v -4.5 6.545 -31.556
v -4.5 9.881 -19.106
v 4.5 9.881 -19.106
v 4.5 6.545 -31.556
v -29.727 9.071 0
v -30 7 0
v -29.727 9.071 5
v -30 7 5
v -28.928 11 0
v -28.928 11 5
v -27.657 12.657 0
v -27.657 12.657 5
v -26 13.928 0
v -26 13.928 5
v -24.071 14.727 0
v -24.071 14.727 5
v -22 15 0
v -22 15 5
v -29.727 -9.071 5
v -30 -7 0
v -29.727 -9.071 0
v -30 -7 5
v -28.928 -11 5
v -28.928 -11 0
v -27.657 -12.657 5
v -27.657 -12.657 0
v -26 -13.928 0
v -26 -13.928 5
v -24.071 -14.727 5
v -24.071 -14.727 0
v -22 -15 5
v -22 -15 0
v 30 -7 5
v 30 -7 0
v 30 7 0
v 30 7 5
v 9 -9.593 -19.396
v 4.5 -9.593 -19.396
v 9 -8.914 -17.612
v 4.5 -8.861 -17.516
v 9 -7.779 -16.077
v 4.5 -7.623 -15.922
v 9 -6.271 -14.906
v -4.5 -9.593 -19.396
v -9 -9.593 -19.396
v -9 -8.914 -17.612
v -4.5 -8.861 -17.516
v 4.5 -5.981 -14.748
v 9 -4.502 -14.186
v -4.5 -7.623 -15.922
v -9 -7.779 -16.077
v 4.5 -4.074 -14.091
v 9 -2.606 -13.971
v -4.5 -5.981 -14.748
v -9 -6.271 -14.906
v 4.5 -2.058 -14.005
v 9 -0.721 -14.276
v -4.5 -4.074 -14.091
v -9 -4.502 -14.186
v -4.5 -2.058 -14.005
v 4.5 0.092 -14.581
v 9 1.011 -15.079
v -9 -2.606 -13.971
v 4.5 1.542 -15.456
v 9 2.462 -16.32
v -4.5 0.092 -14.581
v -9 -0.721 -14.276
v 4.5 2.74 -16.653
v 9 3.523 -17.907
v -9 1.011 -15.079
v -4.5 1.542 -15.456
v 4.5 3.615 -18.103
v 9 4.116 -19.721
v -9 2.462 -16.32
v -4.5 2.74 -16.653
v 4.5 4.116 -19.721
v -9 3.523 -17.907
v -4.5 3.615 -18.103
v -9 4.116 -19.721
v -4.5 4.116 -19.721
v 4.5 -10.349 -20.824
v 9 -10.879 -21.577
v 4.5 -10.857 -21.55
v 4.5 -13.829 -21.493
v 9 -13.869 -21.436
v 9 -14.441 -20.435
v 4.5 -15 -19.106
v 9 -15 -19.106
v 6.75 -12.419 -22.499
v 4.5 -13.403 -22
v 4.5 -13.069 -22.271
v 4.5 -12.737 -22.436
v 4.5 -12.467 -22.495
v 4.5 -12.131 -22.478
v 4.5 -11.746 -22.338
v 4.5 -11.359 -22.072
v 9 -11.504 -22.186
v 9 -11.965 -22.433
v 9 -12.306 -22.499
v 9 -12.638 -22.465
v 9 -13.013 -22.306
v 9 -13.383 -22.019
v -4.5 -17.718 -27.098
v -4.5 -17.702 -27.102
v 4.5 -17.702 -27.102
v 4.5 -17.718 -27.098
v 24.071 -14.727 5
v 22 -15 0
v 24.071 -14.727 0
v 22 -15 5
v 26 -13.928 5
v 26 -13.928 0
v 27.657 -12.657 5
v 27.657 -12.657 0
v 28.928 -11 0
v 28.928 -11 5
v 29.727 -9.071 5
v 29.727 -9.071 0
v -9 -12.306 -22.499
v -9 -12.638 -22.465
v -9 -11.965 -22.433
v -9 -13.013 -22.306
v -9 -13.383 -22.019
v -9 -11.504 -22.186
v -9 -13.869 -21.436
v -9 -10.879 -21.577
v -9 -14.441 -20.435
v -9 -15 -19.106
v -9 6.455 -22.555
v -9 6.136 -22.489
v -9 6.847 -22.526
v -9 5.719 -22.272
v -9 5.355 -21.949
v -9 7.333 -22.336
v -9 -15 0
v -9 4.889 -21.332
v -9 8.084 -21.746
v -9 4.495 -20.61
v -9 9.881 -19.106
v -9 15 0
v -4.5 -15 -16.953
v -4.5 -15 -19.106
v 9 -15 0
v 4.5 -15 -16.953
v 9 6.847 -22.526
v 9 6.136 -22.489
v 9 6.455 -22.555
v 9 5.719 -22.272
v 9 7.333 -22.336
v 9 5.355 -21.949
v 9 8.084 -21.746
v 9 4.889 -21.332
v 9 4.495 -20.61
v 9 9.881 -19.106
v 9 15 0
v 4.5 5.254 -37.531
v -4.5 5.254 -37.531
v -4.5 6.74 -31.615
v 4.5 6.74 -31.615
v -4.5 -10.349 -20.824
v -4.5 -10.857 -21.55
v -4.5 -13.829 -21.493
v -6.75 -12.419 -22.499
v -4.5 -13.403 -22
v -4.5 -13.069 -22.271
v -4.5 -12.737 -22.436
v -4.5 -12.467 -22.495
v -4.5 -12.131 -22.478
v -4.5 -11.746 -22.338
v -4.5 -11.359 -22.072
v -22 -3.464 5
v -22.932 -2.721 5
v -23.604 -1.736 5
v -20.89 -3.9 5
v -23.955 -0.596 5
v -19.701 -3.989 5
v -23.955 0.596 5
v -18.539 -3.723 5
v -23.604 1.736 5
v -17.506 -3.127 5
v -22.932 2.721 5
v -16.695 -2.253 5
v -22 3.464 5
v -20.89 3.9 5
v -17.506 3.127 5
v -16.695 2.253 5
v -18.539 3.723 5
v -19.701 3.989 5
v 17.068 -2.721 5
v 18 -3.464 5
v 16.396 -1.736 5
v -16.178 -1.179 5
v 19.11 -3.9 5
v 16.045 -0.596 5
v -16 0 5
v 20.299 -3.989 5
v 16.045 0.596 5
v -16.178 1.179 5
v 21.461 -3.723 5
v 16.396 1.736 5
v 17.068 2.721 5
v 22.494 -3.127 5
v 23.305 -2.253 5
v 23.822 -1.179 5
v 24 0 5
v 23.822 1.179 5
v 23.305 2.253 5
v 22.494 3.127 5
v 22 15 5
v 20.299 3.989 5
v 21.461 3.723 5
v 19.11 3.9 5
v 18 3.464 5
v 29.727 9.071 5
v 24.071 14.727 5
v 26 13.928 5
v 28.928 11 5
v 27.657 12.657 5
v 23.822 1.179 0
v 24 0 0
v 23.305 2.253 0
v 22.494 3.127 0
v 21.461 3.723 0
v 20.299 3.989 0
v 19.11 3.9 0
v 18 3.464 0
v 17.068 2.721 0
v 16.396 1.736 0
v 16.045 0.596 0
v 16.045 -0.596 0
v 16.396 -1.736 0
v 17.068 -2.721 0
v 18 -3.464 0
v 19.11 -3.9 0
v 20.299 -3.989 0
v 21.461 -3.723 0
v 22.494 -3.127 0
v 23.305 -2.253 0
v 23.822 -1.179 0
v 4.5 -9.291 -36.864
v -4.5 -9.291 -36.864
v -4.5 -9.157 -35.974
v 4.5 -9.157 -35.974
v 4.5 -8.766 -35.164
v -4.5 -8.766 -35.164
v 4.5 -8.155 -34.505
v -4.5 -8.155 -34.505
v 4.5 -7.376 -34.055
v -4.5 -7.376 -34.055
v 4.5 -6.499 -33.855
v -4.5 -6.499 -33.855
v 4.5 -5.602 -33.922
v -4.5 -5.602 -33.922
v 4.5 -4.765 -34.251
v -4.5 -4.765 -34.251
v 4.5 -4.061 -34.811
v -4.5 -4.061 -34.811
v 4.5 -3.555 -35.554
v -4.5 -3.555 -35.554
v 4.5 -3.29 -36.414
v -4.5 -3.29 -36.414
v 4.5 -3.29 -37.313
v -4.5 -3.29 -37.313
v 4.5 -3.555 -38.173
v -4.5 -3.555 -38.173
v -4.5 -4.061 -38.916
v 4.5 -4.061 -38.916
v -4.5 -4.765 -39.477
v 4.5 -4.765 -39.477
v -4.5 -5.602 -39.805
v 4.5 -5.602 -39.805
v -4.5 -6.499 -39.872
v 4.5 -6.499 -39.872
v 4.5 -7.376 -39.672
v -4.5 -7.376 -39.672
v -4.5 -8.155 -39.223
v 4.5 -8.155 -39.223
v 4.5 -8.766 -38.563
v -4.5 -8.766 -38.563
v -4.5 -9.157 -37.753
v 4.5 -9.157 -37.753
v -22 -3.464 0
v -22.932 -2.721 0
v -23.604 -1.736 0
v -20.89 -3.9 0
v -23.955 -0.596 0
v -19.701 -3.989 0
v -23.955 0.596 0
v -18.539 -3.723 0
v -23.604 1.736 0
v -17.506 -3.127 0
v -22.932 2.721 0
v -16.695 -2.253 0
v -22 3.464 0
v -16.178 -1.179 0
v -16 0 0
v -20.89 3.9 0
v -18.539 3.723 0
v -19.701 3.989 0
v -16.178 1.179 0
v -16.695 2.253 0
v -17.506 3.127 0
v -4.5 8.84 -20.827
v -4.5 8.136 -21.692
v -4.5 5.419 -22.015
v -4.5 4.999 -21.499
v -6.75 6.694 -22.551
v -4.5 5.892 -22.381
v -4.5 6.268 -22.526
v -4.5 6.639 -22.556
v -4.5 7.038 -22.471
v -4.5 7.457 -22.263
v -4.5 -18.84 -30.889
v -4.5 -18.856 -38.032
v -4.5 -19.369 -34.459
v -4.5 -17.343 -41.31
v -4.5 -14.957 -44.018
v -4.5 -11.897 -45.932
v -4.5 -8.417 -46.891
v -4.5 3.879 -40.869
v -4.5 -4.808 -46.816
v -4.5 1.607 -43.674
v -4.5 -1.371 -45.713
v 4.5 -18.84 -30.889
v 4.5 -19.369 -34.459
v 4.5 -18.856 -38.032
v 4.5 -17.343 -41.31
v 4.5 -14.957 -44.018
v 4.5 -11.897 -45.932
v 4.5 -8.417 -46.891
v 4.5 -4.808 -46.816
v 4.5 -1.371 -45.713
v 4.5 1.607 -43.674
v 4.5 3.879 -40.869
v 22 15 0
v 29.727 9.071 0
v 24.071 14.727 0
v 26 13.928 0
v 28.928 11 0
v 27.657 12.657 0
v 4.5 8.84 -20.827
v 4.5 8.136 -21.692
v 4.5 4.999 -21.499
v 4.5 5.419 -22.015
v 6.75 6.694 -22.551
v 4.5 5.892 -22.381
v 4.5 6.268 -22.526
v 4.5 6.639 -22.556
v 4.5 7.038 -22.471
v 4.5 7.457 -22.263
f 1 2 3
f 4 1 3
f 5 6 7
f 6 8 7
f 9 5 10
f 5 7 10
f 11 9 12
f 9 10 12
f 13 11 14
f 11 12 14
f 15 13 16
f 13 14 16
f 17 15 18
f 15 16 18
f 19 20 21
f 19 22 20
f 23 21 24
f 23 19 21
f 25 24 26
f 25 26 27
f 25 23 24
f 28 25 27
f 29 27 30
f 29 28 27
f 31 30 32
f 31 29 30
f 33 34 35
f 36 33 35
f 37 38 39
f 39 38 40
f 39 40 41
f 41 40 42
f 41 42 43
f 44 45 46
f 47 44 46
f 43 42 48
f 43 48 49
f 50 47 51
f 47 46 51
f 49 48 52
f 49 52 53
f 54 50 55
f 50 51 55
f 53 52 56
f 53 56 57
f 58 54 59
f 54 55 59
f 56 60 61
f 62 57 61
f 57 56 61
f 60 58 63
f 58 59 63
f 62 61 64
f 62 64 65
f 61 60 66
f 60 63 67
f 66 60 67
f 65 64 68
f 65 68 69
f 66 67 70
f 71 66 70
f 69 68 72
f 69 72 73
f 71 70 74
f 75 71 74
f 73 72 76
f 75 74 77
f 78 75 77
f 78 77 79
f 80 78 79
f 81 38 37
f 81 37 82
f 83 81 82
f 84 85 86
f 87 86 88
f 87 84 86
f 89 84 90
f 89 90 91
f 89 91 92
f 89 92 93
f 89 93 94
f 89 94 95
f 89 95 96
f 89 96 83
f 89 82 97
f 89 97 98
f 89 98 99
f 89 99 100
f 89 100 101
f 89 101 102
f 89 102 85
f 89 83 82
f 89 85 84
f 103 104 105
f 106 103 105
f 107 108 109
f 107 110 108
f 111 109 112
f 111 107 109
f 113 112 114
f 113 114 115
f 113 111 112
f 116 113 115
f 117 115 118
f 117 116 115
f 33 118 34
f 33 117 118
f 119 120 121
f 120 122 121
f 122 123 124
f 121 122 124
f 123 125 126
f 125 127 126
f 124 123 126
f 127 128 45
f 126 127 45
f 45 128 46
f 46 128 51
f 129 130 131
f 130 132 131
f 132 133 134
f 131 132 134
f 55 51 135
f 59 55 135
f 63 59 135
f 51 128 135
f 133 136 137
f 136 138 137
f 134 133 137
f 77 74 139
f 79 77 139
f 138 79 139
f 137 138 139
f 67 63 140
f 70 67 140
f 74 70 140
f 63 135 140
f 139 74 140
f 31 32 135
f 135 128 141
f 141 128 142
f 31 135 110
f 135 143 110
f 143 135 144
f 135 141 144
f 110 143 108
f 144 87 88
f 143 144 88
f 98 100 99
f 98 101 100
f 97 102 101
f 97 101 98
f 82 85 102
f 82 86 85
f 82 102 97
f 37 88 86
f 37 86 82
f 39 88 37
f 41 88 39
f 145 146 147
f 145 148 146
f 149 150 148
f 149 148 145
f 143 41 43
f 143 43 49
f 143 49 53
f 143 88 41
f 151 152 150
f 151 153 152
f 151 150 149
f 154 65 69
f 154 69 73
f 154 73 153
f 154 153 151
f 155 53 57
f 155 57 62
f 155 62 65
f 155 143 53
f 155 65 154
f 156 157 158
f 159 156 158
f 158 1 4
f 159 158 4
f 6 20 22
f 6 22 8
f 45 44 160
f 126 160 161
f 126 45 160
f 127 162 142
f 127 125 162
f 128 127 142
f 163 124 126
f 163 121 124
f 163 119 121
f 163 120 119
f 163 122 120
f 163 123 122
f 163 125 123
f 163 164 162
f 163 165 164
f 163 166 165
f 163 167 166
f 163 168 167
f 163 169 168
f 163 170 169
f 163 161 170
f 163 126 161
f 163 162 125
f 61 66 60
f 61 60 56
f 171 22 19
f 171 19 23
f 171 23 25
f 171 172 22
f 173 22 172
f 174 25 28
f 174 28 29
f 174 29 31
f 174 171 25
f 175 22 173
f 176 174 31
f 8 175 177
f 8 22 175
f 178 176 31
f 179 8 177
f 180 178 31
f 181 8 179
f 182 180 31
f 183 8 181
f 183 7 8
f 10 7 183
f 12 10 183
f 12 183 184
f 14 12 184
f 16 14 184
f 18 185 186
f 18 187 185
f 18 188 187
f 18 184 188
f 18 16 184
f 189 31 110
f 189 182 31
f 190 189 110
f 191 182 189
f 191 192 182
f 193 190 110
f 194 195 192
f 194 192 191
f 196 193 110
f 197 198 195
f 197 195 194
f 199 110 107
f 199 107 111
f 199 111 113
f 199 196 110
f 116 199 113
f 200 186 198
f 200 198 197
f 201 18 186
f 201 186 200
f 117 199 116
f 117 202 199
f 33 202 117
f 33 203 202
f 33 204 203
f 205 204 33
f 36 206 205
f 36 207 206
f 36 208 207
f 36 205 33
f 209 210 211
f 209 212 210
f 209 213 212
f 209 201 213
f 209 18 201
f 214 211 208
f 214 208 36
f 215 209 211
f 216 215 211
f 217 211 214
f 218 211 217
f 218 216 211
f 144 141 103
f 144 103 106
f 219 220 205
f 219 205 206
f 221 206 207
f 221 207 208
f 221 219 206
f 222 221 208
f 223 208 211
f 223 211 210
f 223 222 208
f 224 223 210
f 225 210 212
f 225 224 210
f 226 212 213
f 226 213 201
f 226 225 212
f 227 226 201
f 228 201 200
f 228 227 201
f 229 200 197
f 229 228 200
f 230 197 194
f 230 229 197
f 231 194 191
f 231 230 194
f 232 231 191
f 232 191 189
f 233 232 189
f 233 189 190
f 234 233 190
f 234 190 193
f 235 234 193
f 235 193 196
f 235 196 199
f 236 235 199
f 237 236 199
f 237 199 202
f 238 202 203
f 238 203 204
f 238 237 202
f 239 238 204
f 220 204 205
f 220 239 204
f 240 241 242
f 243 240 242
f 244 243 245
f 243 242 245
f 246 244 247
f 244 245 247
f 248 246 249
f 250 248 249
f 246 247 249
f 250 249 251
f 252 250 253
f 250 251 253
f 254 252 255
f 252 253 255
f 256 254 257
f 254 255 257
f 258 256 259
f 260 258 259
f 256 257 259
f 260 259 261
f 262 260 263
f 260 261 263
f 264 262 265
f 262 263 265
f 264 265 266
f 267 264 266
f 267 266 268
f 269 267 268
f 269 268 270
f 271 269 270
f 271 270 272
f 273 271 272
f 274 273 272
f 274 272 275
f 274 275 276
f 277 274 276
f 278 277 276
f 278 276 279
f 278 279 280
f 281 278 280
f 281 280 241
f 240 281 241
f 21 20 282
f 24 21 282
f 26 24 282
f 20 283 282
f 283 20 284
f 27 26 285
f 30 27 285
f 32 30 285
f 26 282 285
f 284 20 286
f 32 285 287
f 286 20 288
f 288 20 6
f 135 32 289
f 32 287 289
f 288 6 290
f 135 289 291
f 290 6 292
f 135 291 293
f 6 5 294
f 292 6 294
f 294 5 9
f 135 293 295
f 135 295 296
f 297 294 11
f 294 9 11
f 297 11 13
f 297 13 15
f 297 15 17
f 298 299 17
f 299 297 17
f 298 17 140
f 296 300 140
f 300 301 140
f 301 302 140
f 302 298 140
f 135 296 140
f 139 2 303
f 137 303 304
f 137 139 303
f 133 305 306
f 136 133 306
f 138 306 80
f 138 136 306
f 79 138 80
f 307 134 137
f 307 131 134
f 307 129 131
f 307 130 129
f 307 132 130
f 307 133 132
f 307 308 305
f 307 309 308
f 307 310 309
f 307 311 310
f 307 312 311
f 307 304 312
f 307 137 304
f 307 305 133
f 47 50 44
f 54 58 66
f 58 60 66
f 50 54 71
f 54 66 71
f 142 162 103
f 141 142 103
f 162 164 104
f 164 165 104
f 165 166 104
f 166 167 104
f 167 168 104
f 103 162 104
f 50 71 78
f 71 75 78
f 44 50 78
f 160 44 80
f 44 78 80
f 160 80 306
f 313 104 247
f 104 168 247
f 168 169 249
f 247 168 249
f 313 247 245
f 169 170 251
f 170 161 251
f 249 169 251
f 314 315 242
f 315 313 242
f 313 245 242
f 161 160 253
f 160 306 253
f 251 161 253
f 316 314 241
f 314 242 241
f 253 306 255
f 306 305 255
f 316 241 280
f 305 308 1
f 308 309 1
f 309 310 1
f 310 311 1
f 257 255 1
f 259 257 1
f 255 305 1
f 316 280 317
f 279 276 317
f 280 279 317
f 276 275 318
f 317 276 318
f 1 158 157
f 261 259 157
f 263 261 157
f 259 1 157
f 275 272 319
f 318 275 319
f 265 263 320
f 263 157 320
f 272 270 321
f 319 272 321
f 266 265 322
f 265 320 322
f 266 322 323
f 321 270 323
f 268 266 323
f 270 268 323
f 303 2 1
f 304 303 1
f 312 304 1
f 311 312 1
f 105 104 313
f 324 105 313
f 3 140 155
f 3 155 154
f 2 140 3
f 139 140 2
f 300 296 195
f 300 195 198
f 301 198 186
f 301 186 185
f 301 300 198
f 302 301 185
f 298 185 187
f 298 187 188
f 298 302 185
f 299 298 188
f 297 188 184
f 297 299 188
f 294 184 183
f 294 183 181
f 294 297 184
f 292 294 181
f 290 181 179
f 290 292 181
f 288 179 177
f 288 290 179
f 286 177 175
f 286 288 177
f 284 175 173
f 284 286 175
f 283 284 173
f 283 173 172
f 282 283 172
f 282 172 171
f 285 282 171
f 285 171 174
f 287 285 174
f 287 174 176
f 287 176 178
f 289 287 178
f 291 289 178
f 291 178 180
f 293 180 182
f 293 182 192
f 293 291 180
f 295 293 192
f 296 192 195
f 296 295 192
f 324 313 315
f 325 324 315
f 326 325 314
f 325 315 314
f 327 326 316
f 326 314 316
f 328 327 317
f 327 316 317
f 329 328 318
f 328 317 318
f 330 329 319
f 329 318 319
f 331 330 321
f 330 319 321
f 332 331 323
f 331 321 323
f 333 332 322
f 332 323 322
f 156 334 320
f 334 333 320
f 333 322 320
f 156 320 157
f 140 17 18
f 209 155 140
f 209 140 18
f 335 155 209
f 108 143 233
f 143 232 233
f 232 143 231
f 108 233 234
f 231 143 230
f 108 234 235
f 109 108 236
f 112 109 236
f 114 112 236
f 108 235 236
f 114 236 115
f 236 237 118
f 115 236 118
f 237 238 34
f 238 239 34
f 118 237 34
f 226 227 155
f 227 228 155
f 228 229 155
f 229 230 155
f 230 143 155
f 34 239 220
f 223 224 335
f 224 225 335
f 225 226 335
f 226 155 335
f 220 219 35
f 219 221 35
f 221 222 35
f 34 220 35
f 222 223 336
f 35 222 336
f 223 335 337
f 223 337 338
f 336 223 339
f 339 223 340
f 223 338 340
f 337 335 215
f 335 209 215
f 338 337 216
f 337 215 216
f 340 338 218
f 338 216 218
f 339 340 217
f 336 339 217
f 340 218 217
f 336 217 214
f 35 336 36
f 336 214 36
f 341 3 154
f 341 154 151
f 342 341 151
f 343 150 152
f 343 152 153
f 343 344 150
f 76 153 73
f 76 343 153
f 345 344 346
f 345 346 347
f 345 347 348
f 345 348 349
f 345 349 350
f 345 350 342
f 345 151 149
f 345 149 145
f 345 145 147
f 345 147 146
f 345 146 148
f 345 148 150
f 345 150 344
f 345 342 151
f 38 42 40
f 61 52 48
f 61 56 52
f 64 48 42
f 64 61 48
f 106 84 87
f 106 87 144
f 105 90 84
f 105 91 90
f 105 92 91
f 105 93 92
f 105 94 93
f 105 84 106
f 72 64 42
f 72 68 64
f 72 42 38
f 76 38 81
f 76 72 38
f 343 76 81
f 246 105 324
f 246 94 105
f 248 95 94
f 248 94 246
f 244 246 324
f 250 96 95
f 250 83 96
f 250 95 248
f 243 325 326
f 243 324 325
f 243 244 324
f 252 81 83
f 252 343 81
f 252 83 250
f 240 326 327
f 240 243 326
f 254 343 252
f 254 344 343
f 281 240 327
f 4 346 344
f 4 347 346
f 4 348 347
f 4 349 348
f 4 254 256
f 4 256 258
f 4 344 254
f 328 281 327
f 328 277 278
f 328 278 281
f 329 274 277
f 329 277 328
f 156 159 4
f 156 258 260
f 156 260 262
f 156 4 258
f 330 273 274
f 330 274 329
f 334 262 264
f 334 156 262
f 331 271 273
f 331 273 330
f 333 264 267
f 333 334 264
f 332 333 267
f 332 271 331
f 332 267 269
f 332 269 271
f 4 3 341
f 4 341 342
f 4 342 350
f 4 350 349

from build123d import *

# Parameters (mm, degrees)
SKETCH6_W            = 60
SKETCH6_H            = 30
SKETCH6_R            = 4
BOSS_EXTRUDE1_DEPTH  = 5
FILLET3_R            = 8
SKETCH8_W            = 18
SKETCH8_H            = 30
BOSS_EXTRUDE2_DEPTH  = 45
CUT_EXTRUDE1_DEPTH   = 20
CUT_EXTRUDE3_DEPTH   = 18
CUT_EXTRUDE4_DEPTH   = 18
BOSS_EXTRUDE4_DEPTH  = 18
SKETCH22_OUTSIDE_W   = 79.302
SKETCH22_OUTSIDE_H   = 78.983
SKETCH22_OUTSIDE_W_2 = 9
SKETCH22_OUTSIDE_H_2 = 23.546077941
CUT_EXTRUDE5_DEPTH   = 58
SKETCH26_W           = 9
SKETCH26_H           = 16.7
BOSS_EXTRUDE6_DEPTH  = 24.59
SKETCH27_R           = 3.017273599
CUT_EXTRUDE6_DEPTH   = 24.59


with BuildPart() as part:
    # Sketch6 → Boss-Extrude1 (new body)
    with BuildSketch(Plane.XY):
        Rectangle(SKETCH6_W, SKETCH6_H)
        with Locations((-20, 0)):
            Circle(SKETCH6_R, mode=Mode.SUBTRACT)
        with Locations((20, 0)):
            Circle(SKETCH6_R, mode=Mode.SUBTRACT)
    extrude(amount=BOSS_EXTRUDE1_DEPTH)

    # Fillet3
    fillet3_edges = [part.edges().sort_by_distance(p)[0] for p in [
        (30, -15, 2.5),
        (-30, -15, 2.5),
        (-30, 15, 2.5),
        (30, 15, 2.5),
    ]]
    fillet(fillet3_edges, radius=FILLET3_R)

    # Sketch8 → Boss-Extrude2 (add)
    with BuildSketch(Plane(origin=(0, 0, 0), x_dir=(-1, 0, 0), z_dir=(0, 0, -1))):
        Rectangle(SKETCH8_W, SKETCH8_H)
    extrude(amount=BOSS_EXTRUDE2_DEPTH)

    # Sketch10 → Cut-Extrude1 (cut)
    with BuildSketch(Plane.ZY.offset(9)):
        Polygon((0, 15), (-45, 2.942286341), (-45, 15), align=None)
    extrude(amount=-CUT_EXTRUDE1_DEPTH, mode=Mode.SUBTRACT)

    # Sketch17 → Cut-Extrude3 (cut)
    with BuildSketch(Plane.ZY.offset(9)):
        with BuildLine():
            Line((-19.10592487, 9.880582861), (-33.795007399, 5.944655059))
            Line((-33.795007399, 5.944655059), (-33.112800495, -15))
            Line((-33.112800495, -15), (-19.10592487, -15))
            add(Edge.make_bspline(
                [(-19.396101376, -9.592611332), (-25.746279691, -12.541160343), (-19.10592487, -15)],
                knots=[0, 0, 0, 1, 1, 1], degree=2))
            ThreePointArc((-19.396101376, -9.592611332), (-13.970550224, -2.605507152), (-19.721316162, 4.116465866))
            add(Edge.make_bspline(
                [(-19.10592487, 9.880582861), (-25.688303674, 6.38873808), (-19.721316162, 4.116465866)],
                knots=[0, 0, 0, 1, 1, 1], degree=2))
        make_face()
    extrude(amount=-CUT_EXTRUDE3_DEPTH, mode=Mode.SUBTRACT)


with BuildPart() as cut_extrude3_piece_1:
    # of the separate pieces the step leaves, piece 1, a body of its own (cut_extrude3_pieces)
    add(part.part.solids().sort_by_distance((-22, 15, 0))[0])



with BuildPart() as cut_extrude3_piece_2:
    # of the separate pieces the step leaves, piece 2, a body of its own (cut_extrude3_pieces)
    add(part.part.solids().sort_by_distance((-9, 5.944655059, -33.795007399))[0])

    # Sketch18 → Cut-Extrude4 (cut)
    with BuildSketch(Plane.ZY.offset(9)):
        Polygon((-45, 2.942286341), (-33.795007399, 5.944655059), (-33.112800495, -15), (-45, -15), align=None)
    extrude(amount=-CUT_EXTRUDE4_DEPTH, mode=Mode.SUBTRACT)


with BuildPart() as body_2:
    # Sketch20 → Boss-Extrude4 (new body)
    with BuildSketch(Plane.ZY.offset(9)):
        with BuildLine():
            Line((-37.531427351, 5.25433557), (-25.054150065, 8.387111476))
            Line((-25.054150065, 8.387111476), (-24.501921516, -16.92005289))
            Line((-24.501921516, -16.92005289), (-30.888633919, -18.84010578))
            ThreePointArc((-30.888633919, -18.84010578), (-46.53784137, -10.191639988), (-37.531427351, 5.25433557))
        make_face()
    extrude(amount=-BOSS_EXTRUDE4_DEPTH)

    # Sketch22 outside → Cut-Extrude5 (cut)
    with BuildSketch(Plane(origin=(0, -8.762066283, 2.634161307), x_dir=(1, 0, 0), z_dir=(0, -0.9576594298343689, 0.2879034846077966))):
        with Locations((0, -20.7335)):
            Rectangle(SKETCH22_OUTSIDE_W, SKETCH22_OUTSIDE_H)
        with Locations((0, -40.108877346)):
            Rectangle(SKETCH22_OUTSIDE_W_2, SKETCH22_OUTSIDE_H_2, mode=Mode.SUBTRACT)
    extrude(amount=-CUT_EXTRUDE5_DEPTH, mode=Mode.SUBTRACT)


with BuildPart() as cut_extrude3_piece_1_1:
    add(cut_extrude3_piece_1.part)

    add(body_2.part)  # Boss-Extrude6 merges body 2
    # Sketch26 → Boss-Extrude6 (add)
    with BuildSketch(Plane(origin=(0, 13.995190528, -3.75), x_dir=(1, 0, 0), z_dir=(0, 0.9659258262890699, -0.2588190451025147))):
        with Locations((0, 22.410404796)):
            Rectangle(SKETCH26_W, SKETCH26_H)
    extrude(amount=-BOSS_EXTRUDE6_DEPTH)

    # Sketch27 → Cut-Extrude6 (cut)
    with BuildSketch(Plane.ZY.offset(4.5)):
        with Locations(Location((-36.863547302, -6.273312821, 0), (0, 0, 270))):
            Circle(SKETCH27_R)
    extrude(amount=-CUT_EXTRUDE6_DEPTH, mode=Mode.SUBTRACT)


solid = cut_extrude3_piece_1_1.part
